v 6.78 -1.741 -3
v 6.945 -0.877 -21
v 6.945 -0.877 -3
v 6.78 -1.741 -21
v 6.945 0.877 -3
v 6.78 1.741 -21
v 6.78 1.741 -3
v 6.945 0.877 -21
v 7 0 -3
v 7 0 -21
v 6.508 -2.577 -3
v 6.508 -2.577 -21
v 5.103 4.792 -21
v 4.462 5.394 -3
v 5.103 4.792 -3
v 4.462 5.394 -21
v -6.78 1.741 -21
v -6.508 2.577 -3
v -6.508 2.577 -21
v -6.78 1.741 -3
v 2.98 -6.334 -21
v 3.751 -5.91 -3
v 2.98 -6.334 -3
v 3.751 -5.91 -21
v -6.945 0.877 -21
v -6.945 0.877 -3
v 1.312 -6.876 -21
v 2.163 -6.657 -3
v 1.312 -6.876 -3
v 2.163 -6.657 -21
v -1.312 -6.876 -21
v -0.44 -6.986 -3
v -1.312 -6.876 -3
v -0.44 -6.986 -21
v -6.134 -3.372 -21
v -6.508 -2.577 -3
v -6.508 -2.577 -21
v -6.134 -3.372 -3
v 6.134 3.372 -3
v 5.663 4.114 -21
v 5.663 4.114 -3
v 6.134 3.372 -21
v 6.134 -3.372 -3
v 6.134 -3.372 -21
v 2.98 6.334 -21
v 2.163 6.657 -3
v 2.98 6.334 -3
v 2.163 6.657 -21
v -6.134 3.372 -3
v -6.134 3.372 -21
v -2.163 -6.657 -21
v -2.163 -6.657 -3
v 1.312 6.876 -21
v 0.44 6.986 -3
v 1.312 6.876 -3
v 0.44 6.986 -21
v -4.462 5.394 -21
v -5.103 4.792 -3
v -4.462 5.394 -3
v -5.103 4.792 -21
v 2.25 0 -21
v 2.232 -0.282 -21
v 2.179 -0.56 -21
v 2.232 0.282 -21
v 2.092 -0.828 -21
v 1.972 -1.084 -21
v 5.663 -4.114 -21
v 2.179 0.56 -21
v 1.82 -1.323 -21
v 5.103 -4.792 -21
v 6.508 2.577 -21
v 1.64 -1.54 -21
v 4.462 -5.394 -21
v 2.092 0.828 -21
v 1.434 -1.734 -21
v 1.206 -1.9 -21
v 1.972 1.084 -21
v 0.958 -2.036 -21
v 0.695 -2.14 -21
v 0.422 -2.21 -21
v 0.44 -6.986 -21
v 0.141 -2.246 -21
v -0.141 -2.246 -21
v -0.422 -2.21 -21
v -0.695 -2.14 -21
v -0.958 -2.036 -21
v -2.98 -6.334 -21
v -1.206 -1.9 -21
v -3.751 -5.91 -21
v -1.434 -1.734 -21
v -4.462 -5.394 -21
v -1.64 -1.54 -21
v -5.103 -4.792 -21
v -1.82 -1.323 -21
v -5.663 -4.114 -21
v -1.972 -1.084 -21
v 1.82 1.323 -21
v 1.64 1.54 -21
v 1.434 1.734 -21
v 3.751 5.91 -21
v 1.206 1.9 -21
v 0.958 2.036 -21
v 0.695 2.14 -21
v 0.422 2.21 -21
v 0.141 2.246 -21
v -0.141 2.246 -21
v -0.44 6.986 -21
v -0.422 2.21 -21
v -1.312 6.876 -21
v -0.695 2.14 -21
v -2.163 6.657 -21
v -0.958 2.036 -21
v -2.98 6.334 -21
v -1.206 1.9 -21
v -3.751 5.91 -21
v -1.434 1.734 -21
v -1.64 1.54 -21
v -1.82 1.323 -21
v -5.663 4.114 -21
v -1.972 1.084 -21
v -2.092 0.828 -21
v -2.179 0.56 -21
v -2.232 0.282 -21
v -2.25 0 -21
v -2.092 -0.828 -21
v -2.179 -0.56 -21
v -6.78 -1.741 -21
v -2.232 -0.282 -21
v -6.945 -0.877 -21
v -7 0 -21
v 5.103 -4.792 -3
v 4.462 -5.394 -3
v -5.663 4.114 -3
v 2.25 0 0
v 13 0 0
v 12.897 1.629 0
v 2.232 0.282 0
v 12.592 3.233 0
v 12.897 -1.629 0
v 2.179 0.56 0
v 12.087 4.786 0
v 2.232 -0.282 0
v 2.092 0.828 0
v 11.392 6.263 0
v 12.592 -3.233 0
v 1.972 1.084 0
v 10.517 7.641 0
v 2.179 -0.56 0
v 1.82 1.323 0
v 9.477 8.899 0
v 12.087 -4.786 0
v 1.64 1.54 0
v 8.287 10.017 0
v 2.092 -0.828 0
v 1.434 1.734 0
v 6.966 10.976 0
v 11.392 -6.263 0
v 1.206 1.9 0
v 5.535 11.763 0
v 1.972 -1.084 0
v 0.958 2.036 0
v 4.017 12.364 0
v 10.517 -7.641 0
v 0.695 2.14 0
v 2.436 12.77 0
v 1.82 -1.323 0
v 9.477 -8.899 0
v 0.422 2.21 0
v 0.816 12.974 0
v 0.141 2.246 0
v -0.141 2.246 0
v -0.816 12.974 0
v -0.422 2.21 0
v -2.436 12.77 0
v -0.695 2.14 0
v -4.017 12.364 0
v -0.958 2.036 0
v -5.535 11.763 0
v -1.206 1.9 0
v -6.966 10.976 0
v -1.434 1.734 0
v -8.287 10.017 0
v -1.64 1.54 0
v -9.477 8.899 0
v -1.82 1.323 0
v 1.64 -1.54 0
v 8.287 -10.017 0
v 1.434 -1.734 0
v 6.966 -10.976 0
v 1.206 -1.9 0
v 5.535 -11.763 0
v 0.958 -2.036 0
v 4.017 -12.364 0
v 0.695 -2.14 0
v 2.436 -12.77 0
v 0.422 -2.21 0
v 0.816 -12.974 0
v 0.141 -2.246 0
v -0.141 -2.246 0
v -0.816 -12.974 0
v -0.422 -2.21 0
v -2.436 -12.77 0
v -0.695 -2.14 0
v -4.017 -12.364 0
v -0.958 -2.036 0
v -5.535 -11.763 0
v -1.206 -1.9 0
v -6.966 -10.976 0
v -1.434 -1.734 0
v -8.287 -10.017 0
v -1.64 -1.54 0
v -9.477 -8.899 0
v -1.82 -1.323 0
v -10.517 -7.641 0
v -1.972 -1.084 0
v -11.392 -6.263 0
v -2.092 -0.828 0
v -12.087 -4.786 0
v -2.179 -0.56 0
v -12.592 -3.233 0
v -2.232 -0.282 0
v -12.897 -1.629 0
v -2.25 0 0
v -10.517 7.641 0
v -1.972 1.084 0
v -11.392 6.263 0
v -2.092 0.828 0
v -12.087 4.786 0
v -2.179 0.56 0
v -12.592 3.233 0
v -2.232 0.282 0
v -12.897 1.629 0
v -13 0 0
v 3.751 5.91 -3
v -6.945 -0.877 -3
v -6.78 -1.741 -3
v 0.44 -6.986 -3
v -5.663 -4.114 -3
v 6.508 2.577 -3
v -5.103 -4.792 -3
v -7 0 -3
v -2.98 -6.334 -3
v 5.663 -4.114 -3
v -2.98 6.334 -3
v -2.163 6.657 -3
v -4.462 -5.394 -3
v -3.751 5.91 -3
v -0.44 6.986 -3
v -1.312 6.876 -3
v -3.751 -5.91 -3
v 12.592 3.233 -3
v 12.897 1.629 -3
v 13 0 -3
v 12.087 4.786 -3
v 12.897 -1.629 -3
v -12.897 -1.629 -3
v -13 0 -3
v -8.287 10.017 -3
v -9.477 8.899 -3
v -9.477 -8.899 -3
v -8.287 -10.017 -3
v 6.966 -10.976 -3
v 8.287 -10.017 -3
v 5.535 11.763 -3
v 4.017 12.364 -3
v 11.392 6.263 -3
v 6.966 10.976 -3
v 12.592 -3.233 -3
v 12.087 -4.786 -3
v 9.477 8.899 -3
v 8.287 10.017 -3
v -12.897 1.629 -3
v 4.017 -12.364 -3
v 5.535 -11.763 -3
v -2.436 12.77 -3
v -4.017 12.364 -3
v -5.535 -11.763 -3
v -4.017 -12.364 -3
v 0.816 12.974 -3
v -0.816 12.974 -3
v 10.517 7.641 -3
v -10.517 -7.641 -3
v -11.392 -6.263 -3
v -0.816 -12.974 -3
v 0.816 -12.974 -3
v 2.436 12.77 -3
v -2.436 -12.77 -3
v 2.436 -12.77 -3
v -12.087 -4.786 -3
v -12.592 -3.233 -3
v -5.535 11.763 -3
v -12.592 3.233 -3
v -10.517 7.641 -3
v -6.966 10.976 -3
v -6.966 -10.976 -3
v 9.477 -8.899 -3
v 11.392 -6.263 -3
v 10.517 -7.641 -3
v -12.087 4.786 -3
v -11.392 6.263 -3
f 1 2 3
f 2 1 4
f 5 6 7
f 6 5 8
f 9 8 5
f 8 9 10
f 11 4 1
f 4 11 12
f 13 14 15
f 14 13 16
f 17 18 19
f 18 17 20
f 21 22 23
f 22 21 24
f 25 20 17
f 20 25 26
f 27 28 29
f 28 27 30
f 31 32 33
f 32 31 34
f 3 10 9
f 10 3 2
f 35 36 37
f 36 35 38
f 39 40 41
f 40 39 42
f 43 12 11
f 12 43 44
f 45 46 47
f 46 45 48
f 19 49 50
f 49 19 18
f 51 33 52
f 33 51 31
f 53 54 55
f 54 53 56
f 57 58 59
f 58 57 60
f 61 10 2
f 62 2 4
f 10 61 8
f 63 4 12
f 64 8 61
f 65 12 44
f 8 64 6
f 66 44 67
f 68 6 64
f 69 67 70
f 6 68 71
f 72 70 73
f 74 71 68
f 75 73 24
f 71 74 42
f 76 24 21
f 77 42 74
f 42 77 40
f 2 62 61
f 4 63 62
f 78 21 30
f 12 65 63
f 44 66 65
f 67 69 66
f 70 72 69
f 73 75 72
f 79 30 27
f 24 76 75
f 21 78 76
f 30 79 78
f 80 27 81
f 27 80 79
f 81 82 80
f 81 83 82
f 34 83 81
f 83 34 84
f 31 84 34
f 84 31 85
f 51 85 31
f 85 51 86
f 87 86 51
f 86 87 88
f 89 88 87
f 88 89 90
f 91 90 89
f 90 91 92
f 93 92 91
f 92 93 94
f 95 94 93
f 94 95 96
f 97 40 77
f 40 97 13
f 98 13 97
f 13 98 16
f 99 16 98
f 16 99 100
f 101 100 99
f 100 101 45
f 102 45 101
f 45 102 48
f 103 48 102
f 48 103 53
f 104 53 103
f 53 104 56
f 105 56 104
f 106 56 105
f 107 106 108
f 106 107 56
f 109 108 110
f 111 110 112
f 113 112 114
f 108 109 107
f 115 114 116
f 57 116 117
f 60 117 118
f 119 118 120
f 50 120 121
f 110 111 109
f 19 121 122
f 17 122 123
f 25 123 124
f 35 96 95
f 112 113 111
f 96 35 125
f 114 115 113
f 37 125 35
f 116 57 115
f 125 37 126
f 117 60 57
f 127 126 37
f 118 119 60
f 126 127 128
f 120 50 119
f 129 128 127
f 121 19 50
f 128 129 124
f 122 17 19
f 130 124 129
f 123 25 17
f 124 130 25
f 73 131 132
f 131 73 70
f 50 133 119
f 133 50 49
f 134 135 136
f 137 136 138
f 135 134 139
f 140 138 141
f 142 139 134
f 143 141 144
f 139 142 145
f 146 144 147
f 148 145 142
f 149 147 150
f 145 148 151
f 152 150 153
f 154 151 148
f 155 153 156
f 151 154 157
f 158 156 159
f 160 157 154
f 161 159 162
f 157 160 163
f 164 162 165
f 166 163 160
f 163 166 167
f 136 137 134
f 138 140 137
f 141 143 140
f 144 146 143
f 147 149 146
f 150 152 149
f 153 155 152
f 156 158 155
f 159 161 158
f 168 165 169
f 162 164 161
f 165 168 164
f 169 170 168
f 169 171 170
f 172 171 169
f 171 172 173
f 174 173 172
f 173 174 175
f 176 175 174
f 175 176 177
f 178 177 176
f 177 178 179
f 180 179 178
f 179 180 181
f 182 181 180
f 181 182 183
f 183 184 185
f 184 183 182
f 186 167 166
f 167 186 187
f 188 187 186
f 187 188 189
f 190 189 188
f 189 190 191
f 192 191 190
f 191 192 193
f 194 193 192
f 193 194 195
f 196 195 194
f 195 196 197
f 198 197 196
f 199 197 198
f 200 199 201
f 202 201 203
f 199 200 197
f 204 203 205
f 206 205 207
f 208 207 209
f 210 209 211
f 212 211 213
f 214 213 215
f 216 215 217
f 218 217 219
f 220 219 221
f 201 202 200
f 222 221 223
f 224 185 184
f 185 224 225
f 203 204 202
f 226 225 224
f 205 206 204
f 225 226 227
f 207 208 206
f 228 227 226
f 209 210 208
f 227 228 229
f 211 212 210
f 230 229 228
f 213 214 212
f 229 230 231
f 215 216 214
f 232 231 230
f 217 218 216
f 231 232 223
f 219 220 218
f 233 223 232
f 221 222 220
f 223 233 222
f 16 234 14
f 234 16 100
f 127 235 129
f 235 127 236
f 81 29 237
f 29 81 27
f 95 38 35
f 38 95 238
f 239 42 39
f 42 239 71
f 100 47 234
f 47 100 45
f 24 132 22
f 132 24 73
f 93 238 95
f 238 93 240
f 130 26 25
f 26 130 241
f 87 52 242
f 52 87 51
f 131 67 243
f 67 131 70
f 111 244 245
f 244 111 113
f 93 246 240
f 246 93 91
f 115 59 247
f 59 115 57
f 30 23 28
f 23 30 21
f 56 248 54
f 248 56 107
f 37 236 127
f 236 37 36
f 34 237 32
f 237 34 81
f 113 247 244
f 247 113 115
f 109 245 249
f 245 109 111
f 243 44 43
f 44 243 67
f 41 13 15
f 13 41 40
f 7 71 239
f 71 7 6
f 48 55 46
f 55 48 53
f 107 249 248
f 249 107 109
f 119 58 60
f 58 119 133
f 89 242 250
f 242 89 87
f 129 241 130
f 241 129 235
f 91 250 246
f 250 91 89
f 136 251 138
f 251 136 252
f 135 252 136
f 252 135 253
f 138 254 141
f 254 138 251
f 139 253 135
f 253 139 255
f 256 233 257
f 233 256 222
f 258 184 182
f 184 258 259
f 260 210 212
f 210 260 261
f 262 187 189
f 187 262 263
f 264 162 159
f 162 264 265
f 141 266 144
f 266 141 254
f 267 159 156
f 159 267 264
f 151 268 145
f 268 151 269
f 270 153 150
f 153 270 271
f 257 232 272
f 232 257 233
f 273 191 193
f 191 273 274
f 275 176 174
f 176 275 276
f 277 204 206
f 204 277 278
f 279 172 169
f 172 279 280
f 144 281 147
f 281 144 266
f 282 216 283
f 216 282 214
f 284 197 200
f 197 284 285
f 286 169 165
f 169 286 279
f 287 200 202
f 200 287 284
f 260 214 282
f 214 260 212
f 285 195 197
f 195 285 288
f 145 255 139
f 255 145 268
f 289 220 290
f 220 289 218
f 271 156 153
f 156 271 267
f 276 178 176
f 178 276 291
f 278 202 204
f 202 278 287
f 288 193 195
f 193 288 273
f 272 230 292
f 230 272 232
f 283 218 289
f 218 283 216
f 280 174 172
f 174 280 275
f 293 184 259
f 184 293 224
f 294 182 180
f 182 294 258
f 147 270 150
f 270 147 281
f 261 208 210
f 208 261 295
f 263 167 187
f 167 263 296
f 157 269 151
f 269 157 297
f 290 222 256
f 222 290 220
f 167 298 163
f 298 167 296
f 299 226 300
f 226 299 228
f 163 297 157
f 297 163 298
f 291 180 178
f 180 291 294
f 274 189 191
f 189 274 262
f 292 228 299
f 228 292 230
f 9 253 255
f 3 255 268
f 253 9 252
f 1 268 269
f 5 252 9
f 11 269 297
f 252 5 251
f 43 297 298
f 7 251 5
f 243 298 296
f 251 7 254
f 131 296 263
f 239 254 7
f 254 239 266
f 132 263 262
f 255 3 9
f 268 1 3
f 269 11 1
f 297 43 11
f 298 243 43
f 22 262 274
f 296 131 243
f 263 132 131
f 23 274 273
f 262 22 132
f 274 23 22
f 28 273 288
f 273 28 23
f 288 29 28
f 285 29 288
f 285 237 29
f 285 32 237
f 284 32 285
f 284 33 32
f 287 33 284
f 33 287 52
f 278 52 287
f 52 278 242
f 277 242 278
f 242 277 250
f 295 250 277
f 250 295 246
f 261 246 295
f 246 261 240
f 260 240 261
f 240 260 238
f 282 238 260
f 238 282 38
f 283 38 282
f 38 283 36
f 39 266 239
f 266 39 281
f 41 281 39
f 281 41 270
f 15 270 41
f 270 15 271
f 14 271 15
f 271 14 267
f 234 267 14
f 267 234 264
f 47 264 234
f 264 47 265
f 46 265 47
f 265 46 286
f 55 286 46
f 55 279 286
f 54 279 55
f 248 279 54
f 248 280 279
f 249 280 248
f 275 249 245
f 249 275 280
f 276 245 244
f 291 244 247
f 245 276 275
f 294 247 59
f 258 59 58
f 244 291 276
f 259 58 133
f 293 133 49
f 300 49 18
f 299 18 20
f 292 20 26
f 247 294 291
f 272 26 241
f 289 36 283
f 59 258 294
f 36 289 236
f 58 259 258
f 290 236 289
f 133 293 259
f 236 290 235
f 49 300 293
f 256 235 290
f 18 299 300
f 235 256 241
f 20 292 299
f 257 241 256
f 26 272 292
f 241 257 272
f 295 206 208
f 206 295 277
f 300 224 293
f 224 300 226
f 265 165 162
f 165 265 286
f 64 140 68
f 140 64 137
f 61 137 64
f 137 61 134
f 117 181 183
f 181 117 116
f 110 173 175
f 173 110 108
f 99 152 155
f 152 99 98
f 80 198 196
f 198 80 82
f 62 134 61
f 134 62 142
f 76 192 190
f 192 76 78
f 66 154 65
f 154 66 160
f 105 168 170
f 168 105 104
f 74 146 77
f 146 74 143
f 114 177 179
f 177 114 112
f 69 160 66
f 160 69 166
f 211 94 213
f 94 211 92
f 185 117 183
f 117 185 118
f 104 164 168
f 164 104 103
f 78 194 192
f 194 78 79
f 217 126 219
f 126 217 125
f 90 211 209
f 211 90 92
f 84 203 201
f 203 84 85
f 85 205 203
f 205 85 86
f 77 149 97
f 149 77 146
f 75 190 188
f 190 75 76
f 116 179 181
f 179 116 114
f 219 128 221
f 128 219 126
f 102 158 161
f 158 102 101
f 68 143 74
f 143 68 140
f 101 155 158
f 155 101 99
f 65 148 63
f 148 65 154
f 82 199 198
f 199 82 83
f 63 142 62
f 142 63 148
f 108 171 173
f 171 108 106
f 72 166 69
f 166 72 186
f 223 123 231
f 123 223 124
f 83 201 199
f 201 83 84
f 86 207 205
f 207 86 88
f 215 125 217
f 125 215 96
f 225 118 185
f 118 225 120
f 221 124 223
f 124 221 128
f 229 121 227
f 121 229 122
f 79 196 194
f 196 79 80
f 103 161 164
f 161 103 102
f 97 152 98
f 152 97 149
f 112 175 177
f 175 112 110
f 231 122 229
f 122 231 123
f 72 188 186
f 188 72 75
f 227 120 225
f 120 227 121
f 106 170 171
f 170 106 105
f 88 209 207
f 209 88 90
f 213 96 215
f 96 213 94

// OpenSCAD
$fn = 50;


difference() {
	union() {
		translate(v = [0, 0, -21.0000000000]) {
			cylinder(h = 21, r = 7.0000000000);
		}
		translate(v = [0, 0, -3.0000000000]) {
			cylinder(h = 3, r = 13.0000000000);
		}
	}
	union() {
		#translate(v = [0, 0, -21]) {
			cylinder(h = 21, r = 2.2500000000);
		}
	}
}
